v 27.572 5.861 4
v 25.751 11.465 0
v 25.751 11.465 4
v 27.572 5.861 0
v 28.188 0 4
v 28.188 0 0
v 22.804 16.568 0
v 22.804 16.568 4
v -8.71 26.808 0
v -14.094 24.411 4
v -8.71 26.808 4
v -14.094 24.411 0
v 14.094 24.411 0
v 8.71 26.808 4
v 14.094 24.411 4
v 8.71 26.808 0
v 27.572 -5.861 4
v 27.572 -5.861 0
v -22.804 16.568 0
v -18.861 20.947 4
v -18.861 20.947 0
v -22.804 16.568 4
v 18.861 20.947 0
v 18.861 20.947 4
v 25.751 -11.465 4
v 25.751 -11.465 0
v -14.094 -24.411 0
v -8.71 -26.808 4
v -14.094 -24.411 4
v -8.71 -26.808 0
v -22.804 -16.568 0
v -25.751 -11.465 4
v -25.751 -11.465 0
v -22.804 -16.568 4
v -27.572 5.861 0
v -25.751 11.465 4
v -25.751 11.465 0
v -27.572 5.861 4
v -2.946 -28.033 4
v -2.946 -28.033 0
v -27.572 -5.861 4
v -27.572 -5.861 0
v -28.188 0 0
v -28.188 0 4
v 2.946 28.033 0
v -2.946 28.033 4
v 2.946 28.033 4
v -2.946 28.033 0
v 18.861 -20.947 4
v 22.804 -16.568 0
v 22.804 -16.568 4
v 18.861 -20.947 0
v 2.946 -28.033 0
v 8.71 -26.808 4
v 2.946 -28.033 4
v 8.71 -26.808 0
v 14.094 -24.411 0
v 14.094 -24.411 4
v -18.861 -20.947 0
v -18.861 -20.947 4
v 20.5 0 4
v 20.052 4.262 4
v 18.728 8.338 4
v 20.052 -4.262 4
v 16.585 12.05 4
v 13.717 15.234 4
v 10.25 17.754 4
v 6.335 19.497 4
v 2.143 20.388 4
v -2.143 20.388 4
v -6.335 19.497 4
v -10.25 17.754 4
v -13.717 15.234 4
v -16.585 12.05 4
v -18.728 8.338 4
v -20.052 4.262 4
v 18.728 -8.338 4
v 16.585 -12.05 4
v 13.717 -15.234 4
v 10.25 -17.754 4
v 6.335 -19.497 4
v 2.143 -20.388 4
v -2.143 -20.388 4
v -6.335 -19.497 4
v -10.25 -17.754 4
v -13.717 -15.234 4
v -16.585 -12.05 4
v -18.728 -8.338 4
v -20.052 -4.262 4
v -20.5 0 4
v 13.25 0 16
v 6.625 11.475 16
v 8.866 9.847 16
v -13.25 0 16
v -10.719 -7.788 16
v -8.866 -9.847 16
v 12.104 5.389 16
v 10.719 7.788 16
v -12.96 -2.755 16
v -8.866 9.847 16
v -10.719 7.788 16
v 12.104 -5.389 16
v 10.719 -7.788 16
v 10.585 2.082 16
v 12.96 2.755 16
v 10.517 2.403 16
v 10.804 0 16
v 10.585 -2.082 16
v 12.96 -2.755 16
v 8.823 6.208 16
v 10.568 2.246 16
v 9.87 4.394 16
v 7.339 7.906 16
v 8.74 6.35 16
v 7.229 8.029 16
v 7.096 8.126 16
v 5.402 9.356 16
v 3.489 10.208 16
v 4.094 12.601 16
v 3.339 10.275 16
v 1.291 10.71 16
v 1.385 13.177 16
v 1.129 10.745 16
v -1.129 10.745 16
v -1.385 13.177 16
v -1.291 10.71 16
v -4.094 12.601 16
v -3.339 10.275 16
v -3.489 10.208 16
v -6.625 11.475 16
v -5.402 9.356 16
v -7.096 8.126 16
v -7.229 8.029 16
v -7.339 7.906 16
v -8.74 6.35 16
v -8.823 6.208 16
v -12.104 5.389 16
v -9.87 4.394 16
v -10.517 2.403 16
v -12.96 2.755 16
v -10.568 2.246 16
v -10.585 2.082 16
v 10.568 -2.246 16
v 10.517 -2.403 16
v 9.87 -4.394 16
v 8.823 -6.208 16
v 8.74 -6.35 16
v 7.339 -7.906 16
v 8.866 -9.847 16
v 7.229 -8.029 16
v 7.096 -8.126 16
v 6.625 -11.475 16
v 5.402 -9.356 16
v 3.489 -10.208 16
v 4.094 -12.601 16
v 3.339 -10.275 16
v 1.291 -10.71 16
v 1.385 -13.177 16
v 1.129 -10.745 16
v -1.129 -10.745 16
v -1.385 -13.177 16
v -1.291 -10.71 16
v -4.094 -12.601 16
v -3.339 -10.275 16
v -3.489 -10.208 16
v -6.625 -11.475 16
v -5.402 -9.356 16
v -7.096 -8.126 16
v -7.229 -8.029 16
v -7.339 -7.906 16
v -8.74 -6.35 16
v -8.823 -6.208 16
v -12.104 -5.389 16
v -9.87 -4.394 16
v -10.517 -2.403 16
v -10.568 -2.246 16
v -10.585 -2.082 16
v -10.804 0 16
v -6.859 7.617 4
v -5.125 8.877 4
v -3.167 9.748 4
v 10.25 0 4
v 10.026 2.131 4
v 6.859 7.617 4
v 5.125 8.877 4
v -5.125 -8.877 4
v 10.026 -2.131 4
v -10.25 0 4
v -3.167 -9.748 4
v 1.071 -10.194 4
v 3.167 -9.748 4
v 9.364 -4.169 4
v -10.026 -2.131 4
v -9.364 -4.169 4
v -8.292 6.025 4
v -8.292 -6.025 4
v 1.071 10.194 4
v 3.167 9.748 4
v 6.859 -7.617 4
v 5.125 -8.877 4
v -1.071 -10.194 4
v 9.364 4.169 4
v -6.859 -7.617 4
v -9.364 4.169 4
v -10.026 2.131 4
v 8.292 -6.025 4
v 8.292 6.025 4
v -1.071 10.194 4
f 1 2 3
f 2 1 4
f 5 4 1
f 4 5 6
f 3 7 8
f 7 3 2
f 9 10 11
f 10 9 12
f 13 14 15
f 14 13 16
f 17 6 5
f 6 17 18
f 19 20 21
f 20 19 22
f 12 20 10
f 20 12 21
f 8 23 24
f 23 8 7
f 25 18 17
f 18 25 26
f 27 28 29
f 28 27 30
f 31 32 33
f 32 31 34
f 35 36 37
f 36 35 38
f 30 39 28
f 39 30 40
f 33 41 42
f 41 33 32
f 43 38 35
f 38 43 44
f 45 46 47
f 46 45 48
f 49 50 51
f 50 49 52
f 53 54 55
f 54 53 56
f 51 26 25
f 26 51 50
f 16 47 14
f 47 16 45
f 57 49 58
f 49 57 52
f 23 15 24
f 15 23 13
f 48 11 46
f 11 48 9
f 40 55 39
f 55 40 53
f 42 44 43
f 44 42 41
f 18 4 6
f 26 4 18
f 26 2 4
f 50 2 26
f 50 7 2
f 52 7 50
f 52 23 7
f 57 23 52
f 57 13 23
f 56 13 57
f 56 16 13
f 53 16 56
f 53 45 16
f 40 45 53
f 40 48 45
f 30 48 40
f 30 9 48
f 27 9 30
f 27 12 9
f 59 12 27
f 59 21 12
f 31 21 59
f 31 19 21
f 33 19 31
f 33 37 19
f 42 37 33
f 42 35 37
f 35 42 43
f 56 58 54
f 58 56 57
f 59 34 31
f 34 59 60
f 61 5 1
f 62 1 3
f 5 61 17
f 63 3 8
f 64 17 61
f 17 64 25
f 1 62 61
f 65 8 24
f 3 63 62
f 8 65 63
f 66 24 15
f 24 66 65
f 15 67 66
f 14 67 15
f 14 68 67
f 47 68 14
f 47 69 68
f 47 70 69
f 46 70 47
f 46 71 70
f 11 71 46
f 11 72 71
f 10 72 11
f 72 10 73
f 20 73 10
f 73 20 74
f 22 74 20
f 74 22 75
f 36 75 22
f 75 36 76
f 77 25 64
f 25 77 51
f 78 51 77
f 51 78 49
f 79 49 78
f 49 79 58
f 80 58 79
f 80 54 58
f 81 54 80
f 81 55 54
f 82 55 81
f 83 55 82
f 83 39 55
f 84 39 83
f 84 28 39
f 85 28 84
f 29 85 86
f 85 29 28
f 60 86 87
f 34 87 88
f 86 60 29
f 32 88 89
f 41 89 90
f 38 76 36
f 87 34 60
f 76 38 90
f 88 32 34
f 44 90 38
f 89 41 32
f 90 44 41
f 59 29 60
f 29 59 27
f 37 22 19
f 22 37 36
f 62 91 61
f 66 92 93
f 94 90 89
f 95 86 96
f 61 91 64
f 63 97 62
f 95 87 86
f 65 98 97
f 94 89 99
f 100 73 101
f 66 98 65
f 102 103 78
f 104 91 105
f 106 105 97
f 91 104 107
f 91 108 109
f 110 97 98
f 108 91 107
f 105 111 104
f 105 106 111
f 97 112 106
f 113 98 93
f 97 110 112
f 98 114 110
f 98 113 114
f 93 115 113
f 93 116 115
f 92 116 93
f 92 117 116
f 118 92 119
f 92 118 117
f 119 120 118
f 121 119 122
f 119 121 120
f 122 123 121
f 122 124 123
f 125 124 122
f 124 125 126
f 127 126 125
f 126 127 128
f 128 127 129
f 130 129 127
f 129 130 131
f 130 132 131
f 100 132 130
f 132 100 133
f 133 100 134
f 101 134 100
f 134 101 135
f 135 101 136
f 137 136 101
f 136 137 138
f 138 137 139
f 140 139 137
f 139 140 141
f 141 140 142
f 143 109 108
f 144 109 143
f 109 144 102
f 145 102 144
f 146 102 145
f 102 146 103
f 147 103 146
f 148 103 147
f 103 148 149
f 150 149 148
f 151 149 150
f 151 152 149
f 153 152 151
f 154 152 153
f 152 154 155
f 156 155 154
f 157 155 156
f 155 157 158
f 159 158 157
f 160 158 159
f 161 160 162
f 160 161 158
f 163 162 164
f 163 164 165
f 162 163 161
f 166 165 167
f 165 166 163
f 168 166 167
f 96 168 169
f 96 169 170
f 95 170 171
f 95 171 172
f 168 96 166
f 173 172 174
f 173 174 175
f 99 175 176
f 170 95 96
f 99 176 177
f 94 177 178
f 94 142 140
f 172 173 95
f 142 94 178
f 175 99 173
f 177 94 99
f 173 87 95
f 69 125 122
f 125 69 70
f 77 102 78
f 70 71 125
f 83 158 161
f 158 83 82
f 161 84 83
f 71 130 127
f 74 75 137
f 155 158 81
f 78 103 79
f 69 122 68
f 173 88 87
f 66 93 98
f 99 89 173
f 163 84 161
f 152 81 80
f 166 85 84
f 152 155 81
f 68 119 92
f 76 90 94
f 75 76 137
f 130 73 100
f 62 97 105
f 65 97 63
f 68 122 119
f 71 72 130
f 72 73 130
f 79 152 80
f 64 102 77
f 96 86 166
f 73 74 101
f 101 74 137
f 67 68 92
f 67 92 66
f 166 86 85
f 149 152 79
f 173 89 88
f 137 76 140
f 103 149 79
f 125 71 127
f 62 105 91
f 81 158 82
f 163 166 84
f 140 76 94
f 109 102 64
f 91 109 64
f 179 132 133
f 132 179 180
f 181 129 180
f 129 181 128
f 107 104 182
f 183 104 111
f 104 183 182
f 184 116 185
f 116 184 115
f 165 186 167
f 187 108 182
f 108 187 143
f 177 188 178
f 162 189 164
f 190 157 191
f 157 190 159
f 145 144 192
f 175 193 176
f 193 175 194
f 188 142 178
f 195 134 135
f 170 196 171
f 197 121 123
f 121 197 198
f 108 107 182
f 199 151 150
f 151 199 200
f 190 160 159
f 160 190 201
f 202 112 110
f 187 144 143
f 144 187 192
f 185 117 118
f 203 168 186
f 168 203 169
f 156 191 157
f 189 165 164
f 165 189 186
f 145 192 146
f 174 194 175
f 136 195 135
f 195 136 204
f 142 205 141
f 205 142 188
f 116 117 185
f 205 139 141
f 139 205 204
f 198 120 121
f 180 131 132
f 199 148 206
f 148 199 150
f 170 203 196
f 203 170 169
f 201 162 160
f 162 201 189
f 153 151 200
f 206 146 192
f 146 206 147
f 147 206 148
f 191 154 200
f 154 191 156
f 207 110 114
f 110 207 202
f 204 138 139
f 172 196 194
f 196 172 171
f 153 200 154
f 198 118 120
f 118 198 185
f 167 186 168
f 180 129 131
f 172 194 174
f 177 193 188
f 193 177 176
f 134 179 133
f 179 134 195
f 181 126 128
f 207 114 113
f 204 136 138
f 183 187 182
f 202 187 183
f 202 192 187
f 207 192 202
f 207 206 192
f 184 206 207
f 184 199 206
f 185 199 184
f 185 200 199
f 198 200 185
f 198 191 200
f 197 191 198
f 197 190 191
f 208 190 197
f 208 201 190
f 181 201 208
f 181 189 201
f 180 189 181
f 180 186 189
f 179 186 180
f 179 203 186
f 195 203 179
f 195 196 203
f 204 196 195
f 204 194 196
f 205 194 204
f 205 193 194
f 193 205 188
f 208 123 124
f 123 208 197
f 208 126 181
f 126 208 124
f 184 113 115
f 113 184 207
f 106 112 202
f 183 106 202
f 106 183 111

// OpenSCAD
//Diameter of vial
tool_diameter = 20.5; // Container Store 4 dram glass vial SKU#: 688480
tool_rad = tool_diameter / 2;
//Base is this many times larger than radius of vial
base_multiplier = 2.75;
//Height of base (bottom disk)
base_height = 4;
//Height of conical cap
cap_height = 12;
//Cap base is this many times larger than radius of vial
cap_base_multiplier = 2;
//Width of the wall at top of cap
cap_top_wall_width = 3;
//Added space to adjust for a tighter or looser fit
tool_space_margin = 0.6;

//$fn=60;
difference()
{
	union()
	{
		//Base
		cylinder(r=tool_rad*base_multiplier, h=base_height);

		//Cap
        translate([0,0,base_height])
		cylinder(h=cap_height,
            r1=tool_rad*cap_base_multiplier,
            r2=tool_rad+cap_top_wall_width);
	}

	//Top Opening
	translate([0,0,base_height])
	cylinder(r1=tool_rad,
        r2=tool_rad+tool_space_margin,
        h=cap_height+1);
}
